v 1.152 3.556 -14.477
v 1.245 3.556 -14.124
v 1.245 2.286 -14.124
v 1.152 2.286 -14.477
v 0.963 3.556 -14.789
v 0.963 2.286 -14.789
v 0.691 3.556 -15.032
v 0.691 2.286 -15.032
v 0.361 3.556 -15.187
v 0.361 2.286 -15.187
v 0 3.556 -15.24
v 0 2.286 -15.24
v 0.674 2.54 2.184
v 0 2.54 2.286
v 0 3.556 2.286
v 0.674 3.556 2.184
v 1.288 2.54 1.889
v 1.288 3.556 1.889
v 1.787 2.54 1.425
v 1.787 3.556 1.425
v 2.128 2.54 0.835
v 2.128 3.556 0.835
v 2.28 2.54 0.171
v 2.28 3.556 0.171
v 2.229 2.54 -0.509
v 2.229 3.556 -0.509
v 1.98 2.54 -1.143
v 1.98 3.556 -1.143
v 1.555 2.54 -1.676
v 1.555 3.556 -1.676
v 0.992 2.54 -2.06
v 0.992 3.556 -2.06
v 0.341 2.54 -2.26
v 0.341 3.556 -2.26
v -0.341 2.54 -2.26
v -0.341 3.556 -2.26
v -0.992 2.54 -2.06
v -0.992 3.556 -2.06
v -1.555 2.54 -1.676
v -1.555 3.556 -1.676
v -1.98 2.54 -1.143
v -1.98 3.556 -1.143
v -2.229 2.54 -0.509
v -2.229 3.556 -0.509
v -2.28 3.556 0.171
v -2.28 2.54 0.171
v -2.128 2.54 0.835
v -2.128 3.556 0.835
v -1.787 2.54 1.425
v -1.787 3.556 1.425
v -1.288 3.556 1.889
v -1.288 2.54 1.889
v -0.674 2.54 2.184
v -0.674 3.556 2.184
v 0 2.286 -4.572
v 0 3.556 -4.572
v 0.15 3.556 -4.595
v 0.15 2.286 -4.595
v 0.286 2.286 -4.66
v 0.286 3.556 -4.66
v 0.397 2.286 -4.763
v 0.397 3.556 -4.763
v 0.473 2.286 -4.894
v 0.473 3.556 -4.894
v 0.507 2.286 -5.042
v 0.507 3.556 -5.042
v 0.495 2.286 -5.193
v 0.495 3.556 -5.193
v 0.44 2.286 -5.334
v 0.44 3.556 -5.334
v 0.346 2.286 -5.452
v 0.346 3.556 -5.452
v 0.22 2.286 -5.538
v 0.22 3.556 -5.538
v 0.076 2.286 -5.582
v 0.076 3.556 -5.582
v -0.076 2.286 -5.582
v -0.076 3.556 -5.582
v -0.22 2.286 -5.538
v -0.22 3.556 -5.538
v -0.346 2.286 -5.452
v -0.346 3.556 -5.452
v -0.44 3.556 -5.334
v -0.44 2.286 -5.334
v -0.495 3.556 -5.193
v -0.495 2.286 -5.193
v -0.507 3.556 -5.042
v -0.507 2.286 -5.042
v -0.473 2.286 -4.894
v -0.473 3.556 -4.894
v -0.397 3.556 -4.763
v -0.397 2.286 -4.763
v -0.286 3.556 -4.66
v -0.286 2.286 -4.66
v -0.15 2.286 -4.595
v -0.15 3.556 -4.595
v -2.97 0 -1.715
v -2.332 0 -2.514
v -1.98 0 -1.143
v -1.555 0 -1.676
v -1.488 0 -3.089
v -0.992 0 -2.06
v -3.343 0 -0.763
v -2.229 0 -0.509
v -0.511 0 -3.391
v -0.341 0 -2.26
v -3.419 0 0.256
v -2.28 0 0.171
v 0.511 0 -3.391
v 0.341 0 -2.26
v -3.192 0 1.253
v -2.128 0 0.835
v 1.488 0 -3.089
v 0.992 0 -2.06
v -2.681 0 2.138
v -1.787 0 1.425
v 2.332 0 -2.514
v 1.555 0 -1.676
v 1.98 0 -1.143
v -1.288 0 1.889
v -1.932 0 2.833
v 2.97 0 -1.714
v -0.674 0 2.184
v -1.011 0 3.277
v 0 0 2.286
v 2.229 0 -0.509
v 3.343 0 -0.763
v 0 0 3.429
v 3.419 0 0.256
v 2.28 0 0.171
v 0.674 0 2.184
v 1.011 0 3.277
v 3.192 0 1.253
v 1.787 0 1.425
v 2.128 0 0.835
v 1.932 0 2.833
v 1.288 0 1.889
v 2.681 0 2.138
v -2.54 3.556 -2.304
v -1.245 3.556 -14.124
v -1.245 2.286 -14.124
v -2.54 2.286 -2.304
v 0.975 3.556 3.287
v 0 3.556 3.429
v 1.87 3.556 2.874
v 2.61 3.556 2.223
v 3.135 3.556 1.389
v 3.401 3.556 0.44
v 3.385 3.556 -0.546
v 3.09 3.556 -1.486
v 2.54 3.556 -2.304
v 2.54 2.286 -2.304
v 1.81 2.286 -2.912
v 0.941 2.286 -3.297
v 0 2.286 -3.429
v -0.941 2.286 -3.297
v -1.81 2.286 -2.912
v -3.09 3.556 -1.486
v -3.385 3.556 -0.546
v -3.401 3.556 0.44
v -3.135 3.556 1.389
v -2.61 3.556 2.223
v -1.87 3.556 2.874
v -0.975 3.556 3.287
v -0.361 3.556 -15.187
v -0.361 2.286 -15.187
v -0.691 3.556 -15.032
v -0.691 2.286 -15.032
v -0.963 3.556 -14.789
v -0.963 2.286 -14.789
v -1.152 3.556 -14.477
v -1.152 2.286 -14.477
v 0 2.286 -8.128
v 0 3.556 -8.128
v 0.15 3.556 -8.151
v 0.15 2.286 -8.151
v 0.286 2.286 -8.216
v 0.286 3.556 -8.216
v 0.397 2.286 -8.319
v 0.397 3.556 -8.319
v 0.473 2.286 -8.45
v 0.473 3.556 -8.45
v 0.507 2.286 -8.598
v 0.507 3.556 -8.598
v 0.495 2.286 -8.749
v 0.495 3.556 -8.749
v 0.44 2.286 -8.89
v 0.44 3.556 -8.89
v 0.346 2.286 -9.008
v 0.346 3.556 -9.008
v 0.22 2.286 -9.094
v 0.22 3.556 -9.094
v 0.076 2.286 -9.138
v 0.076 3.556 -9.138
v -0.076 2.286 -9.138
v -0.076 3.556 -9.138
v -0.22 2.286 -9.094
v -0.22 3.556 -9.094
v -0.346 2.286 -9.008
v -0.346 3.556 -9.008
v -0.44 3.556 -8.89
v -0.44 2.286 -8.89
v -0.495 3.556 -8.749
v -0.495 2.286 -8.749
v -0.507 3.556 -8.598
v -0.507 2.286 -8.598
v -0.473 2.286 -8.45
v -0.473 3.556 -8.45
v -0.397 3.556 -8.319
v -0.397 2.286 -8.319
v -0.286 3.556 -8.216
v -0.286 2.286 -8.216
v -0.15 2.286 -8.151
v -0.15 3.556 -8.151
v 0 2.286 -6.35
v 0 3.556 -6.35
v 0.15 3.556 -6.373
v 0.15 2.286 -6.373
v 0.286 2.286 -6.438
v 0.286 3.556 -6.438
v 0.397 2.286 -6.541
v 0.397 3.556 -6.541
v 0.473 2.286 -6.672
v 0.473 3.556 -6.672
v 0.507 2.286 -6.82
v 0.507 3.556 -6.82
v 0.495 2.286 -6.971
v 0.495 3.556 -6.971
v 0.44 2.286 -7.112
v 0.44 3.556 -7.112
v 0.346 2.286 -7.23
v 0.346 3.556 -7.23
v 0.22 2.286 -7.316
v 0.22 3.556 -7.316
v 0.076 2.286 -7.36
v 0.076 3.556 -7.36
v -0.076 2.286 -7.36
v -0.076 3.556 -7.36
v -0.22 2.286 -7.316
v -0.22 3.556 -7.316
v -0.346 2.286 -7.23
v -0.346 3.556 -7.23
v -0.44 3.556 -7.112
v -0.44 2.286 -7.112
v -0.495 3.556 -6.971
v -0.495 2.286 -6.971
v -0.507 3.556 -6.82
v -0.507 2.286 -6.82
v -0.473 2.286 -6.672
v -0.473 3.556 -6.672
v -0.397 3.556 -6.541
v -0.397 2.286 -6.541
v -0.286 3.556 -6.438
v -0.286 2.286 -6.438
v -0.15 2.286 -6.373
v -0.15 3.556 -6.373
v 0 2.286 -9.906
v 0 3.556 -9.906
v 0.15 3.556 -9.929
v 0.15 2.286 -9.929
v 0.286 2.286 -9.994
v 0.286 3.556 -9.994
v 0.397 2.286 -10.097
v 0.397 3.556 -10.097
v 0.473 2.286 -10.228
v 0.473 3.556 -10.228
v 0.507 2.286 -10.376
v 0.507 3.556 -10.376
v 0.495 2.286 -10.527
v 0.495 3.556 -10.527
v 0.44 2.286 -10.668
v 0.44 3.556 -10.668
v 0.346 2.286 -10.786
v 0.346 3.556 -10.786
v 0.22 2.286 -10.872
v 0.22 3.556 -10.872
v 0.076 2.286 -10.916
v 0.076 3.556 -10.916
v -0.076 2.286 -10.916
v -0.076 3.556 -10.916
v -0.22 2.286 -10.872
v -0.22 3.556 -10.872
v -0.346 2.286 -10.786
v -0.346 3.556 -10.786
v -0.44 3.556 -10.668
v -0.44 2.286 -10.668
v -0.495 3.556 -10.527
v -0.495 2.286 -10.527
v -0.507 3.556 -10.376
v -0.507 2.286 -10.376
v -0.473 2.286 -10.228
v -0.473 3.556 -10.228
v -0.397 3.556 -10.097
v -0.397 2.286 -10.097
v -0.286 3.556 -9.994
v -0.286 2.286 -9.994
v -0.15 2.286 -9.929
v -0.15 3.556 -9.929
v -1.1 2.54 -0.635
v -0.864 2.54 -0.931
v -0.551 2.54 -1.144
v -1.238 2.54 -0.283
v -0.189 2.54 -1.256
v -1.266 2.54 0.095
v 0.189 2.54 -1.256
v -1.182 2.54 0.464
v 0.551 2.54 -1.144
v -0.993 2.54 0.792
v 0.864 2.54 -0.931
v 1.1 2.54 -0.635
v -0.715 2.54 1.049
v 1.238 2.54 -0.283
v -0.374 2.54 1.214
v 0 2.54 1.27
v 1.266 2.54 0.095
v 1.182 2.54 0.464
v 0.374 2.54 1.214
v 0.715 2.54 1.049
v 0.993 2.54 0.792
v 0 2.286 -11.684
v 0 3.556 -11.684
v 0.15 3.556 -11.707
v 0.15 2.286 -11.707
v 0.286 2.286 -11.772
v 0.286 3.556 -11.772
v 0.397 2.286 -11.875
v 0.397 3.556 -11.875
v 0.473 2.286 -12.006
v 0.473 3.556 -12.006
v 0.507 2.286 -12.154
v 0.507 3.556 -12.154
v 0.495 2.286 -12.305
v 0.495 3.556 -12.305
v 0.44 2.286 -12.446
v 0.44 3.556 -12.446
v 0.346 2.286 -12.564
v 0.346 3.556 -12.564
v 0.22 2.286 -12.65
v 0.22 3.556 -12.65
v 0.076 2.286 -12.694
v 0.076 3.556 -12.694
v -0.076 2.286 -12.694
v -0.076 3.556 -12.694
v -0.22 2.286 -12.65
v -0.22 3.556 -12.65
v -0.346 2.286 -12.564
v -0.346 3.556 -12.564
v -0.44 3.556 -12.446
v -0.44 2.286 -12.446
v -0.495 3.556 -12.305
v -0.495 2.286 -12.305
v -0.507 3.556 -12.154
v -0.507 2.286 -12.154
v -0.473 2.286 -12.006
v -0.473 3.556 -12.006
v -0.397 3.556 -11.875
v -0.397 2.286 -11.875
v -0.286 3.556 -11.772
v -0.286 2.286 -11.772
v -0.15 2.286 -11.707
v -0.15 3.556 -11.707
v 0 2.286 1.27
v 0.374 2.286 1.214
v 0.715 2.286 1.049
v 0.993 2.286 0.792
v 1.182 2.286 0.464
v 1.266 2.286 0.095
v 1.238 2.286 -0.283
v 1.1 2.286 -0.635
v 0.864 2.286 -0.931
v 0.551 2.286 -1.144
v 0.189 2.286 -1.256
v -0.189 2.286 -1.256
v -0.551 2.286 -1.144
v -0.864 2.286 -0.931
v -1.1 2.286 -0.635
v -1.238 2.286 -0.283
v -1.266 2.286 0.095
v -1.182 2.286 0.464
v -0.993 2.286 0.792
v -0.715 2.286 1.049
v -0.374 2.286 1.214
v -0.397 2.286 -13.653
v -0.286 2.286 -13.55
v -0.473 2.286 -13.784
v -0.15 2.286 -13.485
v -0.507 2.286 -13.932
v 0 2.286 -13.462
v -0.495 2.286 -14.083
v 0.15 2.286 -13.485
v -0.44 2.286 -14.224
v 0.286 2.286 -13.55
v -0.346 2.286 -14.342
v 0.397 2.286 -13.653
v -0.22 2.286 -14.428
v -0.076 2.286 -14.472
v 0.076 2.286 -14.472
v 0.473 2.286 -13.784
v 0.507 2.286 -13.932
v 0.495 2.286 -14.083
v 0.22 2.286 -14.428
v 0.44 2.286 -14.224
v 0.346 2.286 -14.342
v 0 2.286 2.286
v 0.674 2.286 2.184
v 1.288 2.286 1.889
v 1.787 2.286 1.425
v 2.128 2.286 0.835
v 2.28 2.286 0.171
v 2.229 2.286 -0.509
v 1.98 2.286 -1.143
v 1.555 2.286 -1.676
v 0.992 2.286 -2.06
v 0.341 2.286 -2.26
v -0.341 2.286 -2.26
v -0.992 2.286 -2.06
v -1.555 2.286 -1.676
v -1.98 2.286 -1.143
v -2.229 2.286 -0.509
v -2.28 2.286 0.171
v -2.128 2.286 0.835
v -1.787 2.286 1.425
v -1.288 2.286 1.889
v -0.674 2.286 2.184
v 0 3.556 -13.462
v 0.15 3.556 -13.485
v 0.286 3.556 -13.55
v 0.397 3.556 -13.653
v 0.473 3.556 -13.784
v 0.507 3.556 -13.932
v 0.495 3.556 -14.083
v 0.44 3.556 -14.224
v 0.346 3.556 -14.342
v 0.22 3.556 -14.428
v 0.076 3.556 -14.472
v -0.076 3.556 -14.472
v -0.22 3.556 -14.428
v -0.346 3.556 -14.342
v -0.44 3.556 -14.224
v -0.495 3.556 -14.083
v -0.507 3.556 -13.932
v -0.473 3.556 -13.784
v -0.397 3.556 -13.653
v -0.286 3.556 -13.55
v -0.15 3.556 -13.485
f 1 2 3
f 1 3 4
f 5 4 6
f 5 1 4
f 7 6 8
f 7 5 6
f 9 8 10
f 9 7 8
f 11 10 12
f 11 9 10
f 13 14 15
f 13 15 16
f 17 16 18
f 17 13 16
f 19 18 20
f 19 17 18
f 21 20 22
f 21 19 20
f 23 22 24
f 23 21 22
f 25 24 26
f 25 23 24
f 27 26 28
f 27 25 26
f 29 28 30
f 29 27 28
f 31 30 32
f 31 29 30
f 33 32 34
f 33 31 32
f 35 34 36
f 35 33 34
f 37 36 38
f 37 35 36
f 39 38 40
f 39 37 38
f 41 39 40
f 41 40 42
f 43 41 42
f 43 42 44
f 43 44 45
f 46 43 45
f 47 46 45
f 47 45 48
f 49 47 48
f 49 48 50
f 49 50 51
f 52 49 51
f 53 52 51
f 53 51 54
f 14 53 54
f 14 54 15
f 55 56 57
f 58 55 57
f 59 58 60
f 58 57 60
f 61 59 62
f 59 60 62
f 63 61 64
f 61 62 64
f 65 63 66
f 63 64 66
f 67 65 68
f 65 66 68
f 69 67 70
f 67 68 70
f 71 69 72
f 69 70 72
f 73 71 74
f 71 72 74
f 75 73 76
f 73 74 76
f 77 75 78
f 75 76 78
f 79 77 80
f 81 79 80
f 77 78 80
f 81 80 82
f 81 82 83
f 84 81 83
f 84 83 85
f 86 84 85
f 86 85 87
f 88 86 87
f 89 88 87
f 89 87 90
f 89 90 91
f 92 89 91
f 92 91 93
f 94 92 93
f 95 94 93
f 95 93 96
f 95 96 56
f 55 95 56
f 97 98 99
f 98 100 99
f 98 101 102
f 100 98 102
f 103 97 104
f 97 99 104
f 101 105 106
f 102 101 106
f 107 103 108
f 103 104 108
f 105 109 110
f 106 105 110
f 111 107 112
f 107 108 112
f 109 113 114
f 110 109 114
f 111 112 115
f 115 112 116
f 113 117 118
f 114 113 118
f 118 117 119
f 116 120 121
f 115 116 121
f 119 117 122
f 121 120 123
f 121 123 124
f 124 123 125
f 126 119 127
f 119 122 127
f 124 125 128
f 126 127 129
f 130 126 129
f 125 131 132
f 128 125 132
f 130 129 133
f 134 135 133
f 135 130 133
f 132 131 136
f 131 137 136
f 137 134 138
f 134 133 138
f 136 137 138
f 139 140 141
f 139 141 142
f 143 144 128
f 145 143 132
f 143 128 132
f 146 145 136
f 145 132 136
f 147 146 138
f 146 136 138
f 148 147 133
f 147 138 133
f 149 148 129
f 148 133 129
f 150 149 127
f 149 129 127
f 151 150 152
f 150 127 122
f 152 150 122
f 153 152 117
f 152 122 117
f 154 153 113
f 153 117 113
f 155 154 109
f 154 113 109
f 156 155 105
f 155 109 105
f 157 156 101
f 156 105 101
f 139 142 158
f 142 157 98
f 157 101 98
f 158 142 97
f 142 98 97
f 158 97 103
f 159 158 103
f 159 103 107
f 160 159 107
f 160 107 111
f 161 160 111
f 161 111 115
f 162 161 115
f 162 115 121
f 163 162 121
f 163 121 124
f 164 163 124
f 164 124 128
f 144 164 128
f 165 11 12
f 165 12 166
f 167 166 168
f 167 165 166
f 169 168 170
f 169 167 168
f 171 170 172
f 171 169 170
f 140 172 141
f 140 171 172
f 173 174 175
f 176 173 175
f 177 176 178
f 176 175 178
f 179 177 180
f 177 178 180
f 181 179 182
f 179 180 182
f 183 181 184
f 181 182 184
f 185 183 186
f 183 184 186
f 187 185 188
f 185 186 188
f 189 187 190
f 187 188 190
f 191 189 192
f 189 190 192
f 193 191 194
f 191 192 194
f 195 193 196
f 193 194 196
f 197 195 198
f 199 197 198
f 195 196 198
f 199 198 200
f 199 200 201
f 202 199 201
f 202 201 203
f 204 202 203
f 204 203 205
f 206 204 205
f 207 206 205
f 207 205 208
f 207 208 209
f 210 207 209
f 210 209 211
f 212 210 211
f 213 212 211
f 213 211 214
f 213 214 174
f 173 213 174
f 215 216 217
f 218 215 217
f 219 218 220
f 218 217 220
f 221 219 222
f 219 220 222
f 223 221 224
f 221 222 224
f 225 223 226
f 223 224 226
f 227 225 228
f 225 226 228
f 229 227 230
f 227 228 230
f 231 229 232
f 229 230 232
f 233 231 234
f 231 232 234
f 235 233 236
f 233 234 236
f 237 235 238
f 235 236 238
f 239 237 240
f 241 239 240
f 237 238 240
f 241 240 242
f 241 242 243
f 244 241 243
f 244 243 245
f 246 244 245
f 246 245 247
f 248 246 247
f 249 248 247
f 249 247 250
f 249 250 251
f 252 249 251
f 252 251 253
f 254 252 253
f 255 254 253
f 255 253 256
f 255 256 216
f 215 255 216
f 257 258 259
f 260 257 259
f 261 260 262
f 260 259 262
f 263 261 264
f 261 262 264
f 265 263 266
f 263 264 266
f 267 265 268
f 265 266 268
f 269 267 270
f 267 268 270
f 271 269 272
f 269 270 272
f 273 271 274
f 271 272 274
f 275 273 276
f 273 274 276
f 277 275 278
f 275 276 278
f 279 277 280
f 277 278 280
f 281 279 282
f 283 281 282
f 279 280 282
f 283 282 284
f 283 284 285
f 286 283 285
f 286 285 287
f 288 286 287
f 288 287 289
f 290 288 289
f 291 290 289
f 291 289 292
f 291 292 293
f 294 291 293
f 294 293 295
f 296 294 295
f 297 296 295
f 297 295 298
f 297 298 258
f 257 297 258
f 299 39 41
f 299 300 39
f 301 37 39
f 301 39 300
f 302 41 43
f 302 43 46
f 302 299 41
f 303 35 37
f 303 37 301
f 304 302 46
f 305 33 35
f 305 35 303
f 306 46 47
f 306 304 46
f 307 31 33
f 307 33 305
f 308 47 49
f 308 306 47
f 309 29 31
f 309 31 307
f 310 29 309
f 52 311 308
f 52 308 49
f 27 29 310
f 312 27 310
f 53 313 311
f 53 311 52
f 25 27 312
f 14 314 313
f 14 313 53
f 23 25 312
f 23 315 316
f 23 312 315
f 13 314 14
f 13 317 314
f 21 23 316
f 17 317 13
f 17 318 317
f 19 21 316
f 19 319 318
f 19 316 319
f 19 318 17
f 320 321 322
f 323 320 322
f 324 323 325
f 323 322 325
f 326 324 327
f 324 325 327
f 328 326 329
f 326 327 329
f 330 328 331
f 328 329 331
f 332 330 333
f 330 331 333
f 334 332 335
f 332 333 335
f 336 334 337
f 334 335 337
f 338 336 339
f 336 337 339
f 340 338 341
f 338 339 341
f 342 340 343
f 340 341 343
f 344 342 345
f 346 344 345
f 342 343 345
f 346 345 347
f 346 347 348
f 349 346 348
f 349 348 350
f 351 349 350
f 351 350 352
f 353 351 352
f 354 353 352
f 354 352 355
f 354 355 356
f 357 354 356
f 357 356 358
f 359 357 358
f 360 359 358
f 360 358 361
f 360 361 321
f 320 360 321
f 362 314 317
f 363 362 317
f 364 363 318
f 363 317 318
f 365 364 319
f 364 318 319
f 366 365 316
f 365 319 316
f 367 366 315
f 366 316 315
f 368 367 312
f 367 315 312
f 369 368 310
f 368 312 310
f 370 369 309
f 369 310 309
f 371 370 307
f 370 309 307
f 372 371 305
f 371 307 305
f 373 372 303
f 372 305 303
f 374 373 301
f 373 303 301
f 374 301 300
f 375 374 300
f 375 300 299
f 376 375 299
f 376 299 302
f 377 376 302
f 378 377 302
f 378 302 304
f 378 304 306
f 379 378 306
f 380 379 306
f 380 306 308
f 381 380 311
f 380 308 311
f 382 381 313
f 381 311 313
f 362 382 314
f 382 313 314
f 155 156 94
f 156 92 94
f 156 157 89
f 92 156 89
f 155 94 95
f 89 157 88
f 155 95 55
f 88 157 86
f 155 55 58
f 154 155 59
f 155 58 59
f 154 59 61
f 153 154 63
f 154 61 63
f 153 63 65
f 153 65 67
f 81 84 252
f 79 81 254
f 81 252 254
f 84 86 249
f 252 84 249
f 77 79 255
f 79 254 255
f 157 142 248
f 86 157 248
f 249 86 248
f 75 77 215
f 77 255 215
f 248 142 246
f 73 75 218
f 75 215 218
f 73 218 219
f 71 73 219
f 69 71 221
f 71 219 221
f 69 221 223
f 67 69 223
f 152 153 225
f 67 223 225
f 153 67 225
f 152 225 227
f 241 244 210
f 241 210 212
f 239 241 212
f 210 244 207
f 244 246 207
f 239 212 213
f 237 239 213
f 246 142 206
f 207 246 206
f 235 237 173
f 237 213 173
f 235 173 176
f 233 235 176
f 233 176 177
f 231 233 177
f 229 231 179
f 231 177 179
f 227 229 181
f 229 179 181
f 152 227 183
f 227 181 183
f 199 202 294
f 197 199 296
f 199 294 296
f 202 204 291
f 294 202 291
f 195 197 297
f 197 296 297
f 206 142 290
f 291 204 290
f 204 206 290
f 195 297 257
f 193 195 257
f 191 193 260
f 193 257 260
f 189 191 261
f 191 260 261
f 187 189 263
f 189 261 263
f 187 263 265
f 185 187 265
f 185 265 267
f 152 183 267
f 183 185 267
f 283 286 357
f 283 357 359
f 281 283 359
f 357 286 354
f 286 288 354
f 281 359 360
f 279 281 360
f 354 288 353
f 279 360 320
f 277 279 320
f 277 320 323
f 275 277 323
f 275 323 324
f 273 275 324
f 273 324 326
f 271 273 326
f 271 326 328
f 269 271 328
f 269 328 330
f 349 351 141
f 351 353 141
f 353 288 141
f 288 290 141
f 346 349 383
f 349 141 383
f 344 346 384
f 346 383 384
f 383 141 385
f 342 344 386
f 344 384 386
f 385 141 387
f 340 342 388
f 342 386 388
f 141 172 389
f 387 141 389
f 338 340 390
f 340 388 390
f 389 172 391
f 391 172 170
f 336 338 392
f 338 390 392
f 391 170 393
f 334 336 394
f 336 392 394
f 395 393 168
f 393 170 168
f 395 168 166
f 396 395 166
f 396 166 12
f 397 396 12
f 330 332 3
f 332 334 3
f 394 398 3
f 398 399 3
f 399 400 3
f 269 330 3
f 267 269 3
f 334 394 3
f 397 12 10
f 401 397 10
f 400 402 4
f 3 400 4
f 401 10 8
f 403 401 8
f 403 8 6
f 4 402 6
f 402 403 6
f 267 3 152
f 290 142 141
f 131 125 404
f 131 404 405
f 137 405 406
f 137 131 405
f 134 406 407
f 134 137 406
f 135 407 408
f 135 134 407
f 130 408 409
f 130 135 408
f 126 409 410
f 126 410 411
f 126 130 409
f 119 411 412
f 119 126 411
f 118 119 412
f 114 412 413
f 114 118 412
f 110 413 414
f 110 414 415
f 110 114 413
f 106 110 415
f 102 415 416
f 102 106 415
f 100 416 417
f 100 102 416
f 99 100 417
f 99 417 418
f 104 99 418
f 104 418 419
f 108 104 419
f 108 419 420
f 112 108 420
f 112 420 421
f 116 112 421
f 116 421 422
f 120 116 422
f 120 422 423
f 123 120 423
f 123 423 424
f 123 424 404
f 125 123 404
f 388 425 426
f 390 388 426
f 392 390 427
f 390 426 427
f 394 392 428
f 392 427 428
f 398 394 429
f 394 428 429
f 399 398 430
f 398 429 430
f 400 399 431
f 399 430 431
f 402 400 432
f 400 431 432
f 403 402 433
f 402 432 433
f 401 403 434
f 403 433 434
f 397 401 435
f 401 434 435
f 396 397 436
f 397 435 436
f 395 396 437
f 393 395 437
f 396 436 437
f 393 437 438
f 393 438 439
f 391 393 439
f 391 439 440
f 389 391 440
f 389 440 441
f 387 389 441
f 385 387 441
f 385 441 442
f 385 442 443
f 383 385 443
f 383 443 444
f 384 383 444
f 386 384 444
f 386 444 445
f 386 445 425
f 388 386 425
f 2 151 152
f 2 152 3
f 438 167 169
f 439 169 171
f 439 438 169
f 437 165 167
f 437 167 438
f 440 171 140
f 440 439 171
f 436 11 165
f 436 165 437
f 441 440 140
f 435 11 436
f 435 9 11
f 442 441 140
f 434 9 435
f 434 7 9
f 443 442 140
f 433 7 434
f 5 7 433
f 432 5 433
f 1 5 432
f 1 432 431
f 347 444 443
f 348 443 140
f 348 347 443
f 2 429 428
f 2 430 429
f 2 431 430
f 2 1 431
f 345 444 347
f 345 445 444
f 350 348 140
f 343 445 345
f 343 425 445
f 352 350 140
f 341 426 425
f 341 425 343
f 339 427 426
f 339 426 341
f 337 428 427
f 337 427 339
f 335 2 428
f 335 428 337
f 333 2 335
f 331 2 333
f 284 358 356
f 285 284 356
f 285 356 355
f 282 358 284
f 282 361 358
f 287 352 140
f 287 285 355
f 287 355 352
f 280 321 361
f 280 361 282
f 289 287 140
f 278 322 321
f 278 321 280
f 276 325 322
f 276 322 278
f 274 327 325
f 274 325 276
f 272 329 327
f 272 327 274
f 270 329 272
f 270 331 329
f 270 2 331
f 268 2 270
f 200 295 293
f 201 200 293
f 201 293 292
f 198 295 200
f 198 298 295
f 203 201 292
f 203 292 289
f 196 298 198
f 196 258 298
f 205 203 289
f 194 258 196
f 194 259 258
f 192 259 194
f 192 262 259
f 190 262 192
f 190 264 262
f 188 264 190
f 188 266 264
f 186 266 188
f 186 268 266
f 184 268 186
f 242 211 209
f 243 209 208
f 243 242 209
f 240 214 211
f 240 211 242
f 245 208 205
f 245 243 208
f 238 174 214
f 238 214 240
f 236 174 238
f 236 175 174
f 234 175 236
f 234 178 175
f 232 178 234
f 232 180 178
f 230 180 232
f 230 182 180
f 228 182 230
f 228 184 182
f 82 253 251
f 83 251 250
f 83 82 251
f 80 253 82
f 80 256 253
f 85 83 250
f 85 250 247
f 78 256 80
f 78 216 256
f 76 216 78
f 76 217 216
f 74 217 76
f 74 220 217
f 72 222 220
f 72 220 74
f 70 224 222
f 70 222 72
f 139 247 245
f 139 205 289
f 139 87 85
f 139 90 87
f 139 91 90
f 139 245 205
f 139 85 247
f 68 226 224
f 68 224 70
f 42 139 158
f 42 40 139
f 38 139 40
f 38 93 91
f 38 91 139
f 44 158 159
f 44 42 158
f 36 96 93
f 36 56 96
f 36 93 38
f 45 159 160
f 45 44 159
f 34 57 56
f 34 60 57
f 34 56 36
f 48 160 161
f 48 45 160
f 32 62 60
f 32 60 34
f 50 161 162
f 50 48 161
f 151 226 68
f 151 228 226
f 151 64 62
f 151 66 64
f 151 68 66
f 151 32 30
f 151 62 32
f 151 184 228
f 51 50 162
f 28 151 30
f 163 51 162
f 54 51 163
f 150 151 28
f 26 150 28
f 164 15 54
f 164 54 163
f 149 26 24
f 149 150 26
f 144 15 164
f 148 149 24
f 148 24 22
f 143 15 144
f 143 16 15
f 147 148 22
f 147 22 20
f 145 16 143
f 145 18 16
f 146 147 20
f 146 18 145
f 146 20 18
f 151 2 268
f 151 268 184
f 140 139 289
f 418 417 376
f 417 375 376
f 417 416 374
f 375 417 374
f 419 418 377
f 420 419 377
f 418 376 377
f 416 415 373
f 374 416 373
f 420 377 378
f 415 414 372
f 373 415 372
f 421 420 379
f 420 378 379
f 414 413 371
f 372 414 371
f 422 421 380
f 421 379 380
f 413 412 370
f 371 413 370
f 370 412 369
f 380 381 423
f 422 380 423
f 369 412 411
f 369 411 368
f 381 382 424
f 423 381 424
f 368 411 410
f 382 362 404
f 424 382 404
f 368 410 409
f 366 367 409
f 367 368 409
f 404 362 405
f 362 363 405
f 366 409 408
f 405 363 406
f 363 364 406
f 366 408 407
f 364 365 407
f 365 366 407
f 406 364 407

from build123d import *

# Parameters (mm, degrees)
SKETCH1_R           = 3.429
SKETCH1_R_2         = 2.286
BOSS_EXTRUDE1_DEPTH = 3.556
BOSS_EXTRUDE2_START = -1.27
BOSS_EXTRUDE2_DEPTH = 1.27
BOSS_EXTRUDE3_START = -1.27
SKETCH2_3_R         = 2.286
SKETCH2_3_R_2       = 1.27
BOSS_EXTRUDE3_DEPTH = 0.254
SKETCH3_R           = 0.508
CUT_EXTRUDE1_DEPTH  = 17.020635974
LPATTERN1_COUNT     = 6
LPATTERN1_PITCH     = 1.778


with BuildPart() as part:
    # Sketch1 → Boss-Extrude1 (new body)
    with BuildSketch(Plane(origin=(0, 0, 0), x_dir=(1, 0, 0), z_dir=(0, 1, 0))):
        Circle(SKETCH1_R)
        Circle(SKETCH1_R_2, mode=Mode.SUBTRACT)
    extrude(amount=BOSS_EXTRUDE1_DEPTH)

    # Sketch2 → Boss-Extrude2 (add)
    with BuildSketch(Plane(origin=(0, 3.556, 0), x_dir=(1, 0, 0), z_dir=(0, 1, 0)).offset(BOSS_EXTRUDE2_START)):
        with BuildLine():
            ThreePointArc((-2.54, 2.303571358), (0, 3.429), (2.54, 2.303571358))
            Line((2.54, 2.303571358), (1.244511661, 14.124427226))
            ThreePointArc((1.244511661, 14.124427226), (0, 15.24), (-1.244511661, 14.124427226))
            Line((-1.244511661, 14.124427226), (-2.54, 2.303571358))
        make_face()
    extrude(amount=BOSS_EXTRUDE2_DEPTH)

    # Sketch2<3> → Boss-Extrude3 (add)
    with BuildSketch(Plane(origin=(0, 3.556, 0), x_dir=(1, 0, 0), z_dir=(0, 1, 0)).offset(BOSS_EXTRUDE3_START)):
        Circle(SKETCH2_3_R)
        Circle(SKETCH2_3_R_2, mode=Mode.SUBTRACT)
    extrude(amount=BOSS_EXTRUDE3_DEPTH)

    # Sketch3 → Cut-Extrude1 (cut, through all)
    with BuildSketch(Plane(origin=(0, 3.556, 0), x_dir=(1, 0, 0), z_dir=(0, 1, 0))):
        with Locations((0, 5.08)):
            Circle(SKETCH3_R)
    cut_extrude1 = extrude(amount=-CUT_EXTRUDE1_DEPTH, mode=Mode.SUBTRACT)

    # LPattern1: Cut-Extrude1 ×6
    with Locations(*[(0, 0, -i * LPATTERN1_PITCH) for i in range(1, LPATTERN1_COUNT)]):
        add(cut_extrude1, mode=Mode.SUBTRACT)


solid = part.part
